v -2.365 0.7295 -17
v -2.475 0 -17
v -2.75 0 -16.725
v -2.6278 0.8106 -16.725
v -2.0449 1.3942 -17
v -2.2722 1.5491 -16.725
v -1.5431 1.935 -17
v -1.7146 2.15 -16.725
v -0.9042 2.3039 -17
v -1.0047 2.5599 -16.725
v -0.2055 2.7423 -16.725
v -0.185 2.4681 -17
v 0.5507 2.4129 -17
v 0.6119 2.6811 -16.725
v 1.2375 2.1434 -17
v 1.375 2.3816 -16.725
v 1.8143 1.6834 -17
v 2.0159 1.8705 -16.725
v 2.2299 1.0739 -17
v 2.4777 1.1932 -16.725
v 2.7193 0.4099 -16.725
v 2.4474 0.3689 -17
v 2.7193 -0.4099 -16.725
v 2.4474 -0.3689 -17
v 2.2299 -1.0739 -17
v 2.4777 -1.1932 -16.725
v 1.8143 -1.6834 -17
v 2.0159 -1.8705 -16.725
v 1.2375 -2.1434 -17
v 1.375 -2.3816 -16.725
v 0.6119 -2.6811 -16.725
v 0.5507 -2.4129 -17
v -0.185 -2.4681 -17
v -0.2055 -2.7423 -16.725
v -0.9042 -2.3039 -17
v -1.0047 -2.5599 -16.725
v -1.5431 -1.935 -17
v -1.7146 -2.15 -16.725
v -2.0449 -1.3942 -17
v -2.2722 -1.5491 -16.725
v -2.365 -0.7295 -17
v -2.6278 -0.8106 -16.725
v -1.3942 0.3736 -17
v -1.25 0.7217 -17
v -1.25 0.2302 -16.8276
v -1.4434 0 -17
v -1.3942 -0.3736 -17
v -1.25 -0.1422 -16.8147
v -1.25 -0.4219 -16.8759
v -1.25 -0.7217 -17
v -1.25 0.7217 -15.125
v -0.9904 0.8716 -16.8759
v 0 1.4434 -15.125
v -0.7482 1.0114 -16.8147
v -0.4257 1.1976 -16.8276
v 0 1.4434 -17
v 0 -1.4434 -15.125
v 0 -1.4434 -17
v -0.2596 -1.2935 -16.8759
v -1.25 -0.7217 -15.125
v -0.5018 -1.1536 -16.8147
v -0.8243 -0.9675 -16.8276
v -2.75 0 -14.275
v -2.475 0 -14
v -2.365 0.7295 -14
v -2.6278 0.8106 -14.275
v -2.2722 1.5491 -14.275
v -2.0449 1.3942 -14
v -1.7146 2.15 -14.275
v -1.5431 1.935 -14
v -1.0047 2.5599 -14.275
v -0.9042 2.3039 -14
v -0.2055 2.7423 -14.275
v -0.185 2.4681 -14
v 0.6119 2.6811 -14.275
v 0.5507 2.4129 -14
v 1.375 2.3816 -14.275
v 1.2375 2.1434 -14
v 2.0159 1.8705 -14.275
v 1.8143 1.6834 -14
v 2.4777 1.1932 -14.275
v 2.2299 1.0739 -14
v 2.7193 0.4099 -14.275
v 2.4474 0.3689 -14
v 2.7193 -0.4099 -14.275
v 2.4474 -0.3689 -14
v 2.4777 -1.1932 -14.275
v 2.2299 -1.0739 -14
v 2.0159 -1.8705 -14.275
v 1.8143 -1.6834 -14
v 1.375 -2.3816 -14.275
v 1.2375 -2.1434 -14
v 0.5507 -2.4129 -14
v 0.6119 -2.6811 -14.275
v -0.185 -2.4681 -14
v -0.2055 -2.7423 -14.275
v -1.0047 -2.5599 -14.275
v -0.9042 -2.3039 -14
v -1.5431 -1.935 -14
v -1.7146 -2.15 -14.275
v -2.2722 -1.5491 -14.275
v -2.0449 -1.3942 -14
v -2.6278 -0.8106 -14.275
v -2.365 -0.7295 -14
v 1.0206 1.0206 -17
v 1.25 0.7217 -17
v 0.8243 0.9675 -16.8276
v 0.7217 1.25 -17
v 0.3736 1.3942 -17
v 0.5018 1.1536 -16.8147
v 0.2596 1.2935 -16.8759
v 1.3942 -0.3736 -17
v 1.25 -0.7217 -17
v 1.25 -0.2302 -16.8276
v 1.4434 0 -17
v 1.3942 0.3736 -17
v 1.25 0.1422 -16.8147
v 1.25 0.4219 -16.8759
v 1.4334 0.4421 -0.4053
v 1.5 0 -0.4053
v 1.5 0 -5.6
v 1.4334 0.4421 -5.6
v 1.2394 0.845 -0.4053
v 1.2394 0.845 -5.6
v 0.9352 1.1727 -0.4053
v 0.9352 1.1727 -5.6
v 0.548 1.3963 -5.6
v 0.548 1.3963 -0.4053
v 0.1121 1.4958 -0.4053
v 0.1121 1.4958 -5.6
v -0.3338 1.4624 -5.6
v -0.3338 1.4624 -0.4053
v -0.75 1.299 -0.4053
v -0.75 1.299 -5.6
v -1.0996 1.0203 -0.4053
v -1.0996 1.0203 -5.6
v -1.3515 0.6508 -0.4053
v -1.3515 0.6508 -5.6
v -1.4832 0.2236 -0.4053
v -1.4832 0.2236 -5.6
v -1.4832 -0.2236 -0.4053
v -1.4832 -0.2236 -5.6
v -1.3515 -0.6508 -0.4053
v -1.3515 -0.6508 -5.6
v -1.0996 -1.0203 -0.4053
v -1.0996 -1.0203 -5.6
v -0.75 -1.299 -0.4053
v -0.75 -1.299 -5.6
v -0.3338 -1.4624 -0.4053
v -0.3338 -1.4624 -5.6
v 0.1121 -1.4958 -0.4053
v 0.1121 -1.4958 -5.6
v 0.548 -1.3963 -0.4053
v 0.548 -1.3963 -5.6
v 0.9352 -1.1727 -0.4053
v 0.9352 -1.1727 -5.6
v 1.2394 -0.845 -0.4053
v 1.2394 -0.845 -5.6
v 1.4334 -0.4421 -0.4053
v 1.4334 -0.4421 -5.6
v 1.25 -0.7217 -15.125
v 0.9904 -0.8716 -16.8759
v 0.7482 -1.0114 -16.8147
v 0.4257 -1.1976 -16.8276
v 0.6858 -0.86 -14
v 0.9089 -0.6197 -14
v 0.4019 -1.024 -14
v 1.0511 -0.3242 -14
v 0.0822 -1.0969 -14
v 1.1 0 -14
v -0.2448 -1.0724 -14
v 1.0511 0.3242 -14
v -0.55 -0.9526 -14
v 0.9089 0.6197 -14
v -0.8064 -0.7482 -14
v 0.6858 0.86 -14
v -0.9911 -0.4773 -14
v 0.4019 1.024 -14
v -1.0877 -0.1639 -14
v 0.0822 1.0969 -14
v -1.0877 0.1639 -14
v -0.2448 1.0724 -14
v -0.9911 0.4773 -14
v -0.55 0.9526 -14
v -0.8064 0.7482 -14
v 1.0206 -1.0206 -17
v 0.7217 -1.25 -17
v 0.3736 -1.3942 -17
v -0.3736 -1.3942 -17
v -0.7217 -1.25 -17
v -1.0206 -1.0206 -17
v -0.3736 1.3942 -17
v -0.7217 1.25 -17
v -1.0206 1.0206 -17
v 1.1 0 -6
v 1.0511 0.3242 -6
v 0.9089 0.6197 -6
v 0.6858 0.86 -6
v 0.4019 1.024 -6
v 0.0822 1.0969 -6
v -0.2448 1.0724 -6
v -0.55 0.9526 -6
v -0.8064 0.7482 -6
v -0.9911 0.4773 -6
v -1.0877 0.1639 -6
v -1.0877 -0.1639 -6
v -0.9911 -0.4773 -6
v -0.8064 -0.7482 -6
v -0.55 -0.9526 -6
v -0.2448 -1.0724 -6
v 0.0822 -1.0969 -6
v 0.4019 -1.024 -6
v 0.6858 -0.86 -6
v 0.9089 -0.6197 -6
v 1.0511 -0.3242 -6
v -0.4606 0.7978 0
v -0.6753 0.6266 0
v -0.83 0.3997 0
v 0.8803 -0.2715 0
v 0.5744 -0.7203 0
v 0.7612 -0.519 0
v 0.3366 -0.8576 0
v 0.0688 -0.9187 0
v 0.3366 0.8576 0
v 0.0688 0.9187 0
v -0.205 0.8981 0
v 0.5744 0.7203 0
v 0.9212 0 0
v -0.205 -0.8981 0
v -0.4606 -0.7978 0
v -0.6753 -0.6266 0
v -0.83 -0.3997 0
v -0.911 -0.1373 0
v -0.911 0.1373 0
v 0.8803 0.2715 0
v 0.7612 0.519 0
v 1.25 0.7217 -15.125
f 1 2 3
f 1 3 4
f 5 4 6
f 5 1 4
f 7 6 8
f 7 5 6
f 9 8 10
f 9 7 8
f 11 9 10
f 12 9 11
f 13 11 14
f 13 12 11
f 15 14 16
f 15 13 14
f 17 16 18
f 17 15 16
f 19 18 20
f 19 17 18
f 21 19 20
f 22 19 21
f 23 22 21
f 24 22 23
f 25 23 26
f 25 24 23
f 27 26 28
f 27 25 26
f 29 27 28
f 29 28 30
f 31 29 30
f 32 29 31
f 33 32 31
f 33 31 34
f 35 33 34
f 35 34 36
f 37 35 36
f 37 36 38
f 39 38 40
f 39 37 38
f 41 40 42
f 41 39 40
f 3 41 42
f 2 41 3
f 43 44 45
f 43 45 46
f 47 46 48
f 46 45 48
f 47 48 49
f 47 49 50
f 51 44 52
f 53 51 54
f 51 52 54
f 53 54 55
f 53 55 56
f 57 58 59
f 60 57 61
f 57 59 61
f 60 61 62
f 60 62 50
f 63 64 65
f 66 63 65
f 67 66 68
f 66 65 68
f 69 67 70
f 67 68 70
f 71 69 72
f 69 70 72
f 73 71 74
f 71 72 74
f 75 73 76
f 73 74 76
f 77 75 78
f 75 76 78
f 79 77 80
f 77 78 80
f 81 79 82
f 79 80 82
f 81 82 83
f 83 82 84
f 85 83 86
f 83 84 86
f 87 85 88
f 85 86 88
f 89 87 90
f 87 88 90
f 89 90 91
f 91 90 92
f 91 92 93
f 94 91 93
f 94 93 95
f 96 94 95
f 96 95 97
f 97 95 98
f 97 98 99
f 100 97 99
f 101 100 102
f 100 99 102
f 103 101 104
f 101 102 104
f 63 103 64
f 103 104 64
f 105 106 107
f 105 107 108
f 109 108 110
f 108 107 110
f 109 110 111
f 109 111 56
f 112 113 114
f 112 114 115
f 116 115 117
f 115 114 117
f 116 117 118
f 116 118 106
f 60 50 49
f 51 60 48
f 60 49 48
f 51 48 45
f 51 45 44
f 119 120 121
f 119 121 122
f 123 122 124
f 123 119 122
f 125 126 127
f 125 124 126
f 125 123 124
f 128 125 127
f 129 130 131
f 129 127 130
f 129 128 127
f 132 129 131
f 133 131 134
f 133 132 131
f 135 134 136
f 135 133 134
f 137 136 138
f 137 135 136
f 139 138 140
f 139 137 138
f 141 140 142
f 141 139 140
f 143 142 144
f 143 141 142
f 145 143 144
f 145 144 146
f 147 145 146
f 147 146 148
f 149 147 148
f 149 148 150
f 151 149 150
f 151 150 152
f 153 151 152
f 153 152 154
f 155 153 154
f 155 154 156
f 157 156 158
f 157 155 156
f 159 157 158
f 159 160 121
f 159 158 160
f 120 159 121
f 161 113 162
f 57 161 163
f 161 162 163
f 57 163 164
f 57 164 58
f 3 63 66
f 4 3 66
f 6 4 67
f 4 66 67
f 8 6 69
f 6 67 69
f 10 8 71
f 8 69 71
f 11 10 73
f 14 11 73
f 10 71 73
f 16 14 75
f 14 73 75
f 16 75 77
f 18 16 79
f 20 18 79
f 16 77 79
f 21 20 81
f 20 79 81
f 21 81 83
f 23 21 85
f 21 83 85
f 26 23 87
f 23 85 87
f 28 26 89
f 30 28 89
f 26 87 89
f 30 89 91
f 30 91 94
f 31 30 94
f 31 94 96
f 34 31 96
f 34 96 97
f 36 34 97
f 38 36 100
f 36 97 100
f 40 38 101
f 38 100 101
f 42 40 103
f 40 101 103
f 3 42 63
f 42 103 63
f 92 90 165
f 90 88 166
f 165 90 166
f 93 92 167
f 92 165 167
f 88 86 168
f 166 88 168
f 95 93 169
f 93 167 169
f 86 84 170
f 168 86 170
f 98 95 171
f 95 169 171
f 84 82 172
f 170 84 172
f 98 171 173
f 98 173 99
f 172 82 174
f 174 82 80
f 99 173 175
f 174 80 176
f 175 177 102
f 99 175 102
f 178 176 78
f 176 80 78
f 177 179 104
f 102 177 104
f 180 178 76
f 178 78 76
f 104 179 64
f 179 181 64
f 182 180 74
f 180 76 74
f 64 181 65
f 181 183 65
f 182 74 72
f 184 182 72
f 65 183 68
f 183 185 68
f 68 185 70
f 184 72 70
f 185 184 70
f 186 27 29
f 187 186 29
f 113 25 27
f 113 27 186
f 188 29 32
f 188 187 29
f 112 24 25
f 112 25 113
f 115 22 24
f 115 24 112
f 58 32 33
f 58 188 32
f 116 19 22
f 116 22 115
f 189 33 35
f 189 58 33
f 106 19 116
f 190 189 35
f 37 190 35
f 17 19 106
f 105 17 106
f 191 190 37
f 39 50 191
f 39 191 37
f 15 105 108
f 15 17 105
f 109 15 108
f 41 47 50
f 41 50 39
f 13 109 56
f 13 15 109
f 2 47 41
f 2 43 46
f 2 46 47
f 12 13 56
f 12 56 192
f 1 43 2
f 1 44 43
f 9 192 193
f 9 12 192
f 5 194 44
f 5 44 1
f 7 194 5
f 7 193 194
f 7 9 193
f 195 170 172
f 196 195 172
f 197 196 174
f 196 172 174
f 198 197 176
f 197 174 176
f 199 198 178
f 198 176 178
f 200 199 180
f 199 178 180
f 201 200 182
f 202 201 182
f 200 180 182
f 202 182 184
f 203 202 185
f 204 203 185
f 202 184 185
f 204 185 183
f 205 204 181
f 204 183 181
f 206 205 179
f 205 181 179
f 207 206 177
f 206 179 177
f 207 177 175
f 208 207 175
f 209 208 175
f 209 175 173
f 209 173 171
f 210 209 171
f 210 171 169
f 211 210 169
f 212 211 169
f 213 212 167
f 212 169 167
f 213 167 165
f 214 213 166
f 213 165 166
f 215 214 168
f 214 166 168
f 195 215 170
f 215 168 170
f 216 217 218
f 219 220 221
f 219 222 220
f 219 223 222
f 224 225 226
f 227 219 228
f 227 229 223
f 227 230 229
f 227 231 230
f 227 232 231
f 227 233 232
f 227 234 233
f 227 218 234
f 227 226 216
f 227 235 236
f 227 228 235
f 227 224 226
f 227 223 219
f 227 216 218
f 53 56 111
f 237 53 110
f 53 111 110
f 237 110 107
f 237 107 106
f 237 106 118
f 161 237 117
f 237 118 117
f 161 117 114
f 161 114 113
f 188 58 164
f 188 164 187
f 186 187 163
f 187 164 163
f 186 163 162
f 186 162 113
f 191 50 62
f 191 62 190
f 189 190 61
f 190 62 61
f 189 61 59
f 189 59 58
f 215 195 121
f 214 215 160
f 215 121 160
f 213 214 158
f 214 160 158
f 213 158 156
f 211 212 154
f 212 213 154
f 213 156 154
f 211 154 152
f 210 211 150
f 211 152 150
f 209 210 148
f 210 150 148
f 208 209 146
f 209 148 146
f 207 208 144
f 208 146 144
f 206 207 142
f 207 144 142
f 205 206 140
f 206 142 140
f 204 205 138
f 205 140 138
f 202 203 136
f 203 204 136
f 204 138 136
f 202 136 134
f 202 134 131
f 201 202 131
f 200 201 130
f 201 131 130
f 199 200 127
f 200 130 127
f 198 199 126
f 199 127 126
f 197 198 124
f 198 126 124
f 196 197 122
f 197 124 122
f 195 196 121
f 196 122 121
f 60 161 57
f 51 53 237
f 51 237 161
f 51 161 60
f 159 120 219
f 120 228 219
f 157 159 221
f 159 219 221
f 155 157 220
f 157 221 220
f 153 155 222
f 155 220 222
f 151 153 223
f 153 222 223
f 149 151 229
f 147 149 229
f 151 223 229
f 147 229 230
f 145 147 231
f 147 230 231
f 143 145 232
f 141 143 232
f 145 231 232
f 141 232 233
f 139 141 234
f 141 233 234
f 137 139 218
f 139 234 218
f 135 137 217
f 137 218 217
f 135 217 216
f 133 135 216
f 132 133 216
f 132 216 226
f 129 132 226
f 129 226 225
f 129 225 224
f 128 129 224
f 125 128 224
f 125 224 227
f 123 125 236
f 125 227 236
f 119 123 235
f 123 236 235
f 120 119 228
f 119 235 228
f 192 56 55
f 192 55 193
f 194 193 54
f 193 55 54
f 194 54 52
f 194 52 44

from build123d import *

# Parameters (mm, degrees)
SKETCH1_R          = 1.5
EXTRUDE1_DEPTH     = 14
SKETCH6_R          = 2.75
EXTRUDE2_DEPTH     = 3
CUT_EXTRUDE1_DEPTH = 1.875
CHAMFER1_SIZE      = 0.275
SKETCH11_OUTSIDE_W = 11.238
SKETCH11_OUTSIDE_H = 11.238
SKETCH11_OUTSIDE_R = 1.1
CUT_EXTRUDE3_DEPTH = 8


with BuildPart() as part:
    # Sketch1 → Extrude1 (new body)
    with BuildSketch(Plane.XY):
        Circle(SKETCH1_R)
    extrude(amount=-EXTRUDE1_DEPTH)

    # Sketch6 → Extrude2 (add)
    with BuildSketch(Plane(origin=(0, 0, -14), x_dir=(-1, 0, 0), z_dir=(0, 0, -1))):
        Circle(SKETCH6_R)
    extrude(amount=EXTRUDE2_DEPTH)

    # Sketch7 → Cut-Extrude1 (cut)
    with BuildSketch(Plane(origin=(0, 0, -17), x_dir=(-1, 0, 0), z_dir=(0, 0, -1))):
        Polygon((0, 1.443375673), (-1.25, 0.721687836), (-1.25, -0.721687836), (0, -1.443375673), (1.25, -0.721687836), (1.25, 0.721687836), align=None)
    extrude(amount=-CUT_EXTRUDE1_DEPTH, mode=Mode.SUBTRACT)

    # Cut-Extrude2 cone 1 section (through the dimple's axis) → Cut-Extrude2 (revolve, cut)
    with BuildSketch(Plane(origin=(0, 0, -17), x_dir=(0, 1, 0), z_dir=(1, 0, 0))):
        Polygon((0, 0), (1.443375673, 0), (0, 1.443375673), align=None)
    revolve(axis=Axis((0, 0, -17), (0, 0, 1)), mode=Mode.SUBTRACT)

    # Chamfer1
    chamfer1_edges = [part.edges().sort_by_distance(p)[0] for p in [
        (2.75, 0, -17),
        (2.75, 0, -14),
    ]]
    chamfer(chamfer1_edges, length=CHAMFER1_SIZE)

    # Sketch11 outside → Cut-Extrude3 (cut)
    with BuildSketch(Plane.XY.offset(-14)):
        Rectangle(SKETCH11_OUTSIDE_W, SKETCH11_OUTSIDE_H)
        Circle(SKETCH11_OUTSIDE_R, mode=Mode.SUBTRACT)
    extrude(amount=CUT_EXTRUDE3_DEPTH, mode=Mode.SUBTRACT)

    # Sketch4 → Cut-Revolve1 (revolve, cut)
    with BuildSketch(Plane(origin=(0, 0, 0), x_dir=(0, 0, -1), z_dir=(1, 0, 0))):
        Polygon((0.405251783, 1.5), (0, 0.921240474), (0, 1.5), align=None)
        Polygon((5.6, 1.5), (6, 1.5), (6, 1.1), align=None)
    revolve(axis=Axis((0, 0, 0), (0, 0, -1)), mode=Mode.SUBTRACT)


solid = part.part
